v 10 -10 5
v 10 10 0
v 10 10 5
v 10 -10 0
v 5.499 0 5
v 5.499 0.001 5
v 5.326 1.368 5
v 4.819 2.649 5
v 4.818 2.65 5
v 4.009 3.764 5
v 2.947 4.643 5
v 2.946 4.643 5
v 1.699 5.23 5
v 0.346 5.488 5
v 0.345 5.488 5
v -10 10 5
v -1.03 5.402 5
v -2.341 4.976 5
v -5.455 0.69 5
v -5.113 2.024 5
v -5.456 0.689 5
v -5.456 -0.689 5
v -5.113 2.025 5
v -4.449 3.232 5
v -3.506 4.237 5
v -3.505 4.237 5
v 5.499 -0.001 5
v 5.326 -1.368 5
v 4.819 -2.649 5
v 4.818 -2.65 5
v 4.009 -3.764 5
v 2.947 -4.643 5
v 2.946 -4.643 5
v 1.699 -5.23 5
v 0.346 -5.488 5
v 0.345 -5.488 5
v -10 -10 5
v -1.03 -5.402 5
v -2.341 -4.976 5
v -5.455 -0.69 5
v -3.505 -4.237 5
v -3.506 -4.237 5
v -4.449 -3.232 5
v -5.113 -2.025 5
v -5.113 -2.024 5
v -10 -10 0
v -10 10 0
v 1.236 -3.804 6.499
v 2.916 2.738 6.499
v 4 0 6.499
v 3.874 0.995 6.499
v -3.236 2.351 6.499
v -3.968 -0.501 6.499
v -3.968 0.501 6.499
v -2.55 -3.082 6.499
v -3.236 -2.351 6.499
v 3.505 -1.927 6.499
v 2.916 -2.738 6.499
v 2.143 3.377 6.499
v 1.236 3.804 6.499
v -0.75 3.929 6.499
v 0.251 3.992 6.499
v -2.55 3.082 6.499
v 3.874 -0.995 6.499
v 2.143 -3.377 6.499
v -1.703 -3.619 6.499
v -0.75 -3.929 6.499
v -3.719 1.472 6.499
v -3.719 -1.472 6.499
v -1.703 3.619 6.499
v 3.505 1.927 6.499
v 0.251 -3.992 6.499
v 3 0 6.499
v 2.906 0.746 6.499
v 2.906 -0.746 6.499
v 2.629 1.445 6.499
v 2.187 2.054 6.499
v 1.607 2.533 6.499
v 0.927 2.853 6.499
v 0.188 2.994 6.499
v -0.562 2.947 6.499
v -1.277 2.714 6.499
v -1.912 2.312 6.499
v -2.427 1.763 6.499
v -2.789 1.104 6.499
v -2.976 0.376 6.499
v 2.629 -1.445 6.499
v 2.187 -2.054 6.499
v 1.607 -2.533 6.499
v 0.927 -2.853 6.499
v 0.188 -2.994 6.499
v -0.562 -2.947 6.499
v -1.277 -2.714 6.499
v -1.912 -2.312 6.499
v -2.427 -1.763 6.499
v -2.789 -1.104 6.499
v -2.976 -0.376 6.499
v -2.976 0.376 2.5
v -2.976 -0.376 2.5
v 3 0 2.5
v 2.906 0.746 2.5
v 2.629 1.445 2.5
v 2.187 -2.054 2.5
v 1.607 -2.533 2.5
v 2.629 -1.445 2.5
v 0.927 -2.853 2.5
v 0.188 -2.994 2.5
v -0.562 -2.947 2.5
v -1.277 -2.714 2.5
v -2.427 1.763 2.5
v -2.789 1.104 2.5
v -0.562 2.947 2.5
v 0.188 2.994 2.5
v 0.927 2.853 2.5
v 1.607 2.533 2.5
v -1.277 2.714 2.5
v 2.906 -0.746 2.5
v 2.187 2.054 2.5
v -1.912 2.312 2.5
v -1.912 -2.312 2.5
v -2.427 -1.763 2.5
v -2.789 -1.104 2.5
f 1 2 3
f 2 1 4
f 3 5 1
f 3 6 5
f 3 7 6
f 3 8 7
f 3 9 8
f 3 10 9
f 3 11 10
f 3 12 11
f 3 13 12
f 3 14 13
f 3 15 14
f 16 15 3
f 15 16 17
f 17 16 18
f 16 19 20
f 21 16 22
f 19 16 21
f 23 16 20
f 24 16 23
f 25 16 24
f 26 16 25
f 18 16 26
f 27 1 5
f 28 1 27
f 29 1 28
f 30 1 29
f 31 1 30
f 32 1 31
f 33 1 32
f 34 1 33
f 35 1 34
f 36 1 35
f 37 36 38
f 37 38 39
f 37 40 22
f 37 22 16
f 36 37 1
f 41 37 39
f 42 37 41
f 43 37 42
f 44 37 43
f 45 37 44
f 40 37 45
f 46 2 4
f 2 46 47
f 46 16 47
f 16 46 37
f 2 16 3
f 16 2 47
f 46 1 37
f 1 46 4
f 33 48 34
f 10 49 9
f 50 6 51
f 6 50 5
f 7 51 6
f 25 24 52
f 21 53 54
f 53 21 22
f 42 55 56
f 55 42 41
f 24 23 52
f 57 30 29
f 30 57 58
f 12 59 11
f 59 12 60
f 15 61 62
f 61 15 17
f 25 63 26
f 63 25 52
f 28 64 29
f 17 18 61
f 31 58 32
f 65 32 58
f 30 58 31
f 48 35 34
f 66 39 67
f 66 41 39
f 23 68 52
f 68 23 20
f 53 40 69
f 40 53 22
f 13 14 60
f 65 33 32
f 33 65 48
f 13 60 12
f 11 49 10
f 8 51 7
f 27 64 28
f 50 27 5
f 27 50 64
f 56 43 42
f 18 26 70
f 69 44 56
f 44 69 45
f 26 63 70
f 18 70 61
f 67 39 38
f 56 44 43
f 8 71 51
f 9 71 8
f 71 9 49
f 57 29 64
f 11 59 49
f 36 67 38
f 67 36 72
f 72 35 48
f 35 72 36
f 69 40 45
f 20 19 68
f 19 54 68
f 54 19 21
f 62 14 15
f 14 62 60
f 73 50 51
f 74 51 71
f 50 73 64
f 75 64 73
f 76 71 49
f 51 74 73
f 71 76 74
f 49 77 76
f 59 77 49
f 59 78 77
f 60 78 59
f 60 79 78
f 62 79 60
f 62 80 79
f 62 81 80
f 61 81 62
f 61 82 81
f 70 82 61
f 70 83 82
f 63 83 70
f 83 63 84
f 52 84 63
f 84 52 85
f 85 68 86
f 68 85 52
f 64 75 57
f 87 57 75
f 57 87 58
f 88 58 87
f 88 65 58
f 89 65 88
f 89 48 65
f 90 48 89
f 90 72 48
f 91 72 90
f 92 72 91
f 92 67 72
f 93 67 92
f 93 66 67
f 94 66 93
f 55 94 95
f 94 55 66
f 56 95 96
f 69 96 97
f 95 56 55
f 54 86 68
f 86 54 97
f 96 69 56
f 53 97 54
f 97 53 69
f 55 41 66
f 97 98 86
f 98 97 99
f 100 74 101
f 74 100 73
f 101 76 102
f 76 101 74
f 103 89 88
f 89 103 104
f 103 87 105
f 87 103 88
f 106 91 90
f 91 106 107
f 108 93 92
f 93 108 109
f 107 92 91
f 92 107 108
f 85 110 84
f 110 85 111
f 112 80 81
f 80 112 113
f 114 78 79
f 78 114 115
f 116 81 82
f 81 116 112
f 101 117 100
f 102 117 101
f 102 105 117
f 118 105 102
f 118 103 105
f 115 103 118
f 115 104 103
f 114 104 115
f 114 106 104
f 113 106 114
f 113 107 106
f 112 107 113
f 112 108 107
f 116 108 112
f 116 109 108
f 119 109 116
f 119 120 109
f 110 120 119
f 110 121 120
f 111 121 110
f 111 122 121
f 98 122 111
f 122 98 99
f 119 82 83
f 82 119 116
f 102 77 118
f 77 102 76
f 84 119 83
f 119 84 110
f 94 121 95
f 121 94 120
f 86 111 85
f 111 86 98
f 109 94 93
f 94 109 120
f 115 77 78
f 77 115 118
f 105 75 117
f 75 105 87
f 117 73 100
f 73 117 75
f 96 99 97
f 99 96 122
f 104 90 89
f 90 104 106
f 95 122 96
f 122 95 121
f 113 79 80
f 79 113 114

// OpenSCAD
w = 20;
h = w;
d = 5;
hole_dia = 6;
hole_d = 4;
hole_fringe = 1.5;
fringe_extra = 1.0;
eps = 0.001;

module stopper() {
    difference() {
        union() {
        translate([-w/2, -h/2, 0]) cube([w, h, d]);
        translate([0, 0, d-eps]) cylinder(d1=hole_dia+2*hole_fringe+2*fringe_extra, d2=hole_dia+2*fringe_extra, h=hole_fringe);
        }
        translate([0, 0, d+hole_fringe-hole_d]) cylinder(d=hole_dia, h=hole_d+eps);
    }
}

stopper($fn=25);
